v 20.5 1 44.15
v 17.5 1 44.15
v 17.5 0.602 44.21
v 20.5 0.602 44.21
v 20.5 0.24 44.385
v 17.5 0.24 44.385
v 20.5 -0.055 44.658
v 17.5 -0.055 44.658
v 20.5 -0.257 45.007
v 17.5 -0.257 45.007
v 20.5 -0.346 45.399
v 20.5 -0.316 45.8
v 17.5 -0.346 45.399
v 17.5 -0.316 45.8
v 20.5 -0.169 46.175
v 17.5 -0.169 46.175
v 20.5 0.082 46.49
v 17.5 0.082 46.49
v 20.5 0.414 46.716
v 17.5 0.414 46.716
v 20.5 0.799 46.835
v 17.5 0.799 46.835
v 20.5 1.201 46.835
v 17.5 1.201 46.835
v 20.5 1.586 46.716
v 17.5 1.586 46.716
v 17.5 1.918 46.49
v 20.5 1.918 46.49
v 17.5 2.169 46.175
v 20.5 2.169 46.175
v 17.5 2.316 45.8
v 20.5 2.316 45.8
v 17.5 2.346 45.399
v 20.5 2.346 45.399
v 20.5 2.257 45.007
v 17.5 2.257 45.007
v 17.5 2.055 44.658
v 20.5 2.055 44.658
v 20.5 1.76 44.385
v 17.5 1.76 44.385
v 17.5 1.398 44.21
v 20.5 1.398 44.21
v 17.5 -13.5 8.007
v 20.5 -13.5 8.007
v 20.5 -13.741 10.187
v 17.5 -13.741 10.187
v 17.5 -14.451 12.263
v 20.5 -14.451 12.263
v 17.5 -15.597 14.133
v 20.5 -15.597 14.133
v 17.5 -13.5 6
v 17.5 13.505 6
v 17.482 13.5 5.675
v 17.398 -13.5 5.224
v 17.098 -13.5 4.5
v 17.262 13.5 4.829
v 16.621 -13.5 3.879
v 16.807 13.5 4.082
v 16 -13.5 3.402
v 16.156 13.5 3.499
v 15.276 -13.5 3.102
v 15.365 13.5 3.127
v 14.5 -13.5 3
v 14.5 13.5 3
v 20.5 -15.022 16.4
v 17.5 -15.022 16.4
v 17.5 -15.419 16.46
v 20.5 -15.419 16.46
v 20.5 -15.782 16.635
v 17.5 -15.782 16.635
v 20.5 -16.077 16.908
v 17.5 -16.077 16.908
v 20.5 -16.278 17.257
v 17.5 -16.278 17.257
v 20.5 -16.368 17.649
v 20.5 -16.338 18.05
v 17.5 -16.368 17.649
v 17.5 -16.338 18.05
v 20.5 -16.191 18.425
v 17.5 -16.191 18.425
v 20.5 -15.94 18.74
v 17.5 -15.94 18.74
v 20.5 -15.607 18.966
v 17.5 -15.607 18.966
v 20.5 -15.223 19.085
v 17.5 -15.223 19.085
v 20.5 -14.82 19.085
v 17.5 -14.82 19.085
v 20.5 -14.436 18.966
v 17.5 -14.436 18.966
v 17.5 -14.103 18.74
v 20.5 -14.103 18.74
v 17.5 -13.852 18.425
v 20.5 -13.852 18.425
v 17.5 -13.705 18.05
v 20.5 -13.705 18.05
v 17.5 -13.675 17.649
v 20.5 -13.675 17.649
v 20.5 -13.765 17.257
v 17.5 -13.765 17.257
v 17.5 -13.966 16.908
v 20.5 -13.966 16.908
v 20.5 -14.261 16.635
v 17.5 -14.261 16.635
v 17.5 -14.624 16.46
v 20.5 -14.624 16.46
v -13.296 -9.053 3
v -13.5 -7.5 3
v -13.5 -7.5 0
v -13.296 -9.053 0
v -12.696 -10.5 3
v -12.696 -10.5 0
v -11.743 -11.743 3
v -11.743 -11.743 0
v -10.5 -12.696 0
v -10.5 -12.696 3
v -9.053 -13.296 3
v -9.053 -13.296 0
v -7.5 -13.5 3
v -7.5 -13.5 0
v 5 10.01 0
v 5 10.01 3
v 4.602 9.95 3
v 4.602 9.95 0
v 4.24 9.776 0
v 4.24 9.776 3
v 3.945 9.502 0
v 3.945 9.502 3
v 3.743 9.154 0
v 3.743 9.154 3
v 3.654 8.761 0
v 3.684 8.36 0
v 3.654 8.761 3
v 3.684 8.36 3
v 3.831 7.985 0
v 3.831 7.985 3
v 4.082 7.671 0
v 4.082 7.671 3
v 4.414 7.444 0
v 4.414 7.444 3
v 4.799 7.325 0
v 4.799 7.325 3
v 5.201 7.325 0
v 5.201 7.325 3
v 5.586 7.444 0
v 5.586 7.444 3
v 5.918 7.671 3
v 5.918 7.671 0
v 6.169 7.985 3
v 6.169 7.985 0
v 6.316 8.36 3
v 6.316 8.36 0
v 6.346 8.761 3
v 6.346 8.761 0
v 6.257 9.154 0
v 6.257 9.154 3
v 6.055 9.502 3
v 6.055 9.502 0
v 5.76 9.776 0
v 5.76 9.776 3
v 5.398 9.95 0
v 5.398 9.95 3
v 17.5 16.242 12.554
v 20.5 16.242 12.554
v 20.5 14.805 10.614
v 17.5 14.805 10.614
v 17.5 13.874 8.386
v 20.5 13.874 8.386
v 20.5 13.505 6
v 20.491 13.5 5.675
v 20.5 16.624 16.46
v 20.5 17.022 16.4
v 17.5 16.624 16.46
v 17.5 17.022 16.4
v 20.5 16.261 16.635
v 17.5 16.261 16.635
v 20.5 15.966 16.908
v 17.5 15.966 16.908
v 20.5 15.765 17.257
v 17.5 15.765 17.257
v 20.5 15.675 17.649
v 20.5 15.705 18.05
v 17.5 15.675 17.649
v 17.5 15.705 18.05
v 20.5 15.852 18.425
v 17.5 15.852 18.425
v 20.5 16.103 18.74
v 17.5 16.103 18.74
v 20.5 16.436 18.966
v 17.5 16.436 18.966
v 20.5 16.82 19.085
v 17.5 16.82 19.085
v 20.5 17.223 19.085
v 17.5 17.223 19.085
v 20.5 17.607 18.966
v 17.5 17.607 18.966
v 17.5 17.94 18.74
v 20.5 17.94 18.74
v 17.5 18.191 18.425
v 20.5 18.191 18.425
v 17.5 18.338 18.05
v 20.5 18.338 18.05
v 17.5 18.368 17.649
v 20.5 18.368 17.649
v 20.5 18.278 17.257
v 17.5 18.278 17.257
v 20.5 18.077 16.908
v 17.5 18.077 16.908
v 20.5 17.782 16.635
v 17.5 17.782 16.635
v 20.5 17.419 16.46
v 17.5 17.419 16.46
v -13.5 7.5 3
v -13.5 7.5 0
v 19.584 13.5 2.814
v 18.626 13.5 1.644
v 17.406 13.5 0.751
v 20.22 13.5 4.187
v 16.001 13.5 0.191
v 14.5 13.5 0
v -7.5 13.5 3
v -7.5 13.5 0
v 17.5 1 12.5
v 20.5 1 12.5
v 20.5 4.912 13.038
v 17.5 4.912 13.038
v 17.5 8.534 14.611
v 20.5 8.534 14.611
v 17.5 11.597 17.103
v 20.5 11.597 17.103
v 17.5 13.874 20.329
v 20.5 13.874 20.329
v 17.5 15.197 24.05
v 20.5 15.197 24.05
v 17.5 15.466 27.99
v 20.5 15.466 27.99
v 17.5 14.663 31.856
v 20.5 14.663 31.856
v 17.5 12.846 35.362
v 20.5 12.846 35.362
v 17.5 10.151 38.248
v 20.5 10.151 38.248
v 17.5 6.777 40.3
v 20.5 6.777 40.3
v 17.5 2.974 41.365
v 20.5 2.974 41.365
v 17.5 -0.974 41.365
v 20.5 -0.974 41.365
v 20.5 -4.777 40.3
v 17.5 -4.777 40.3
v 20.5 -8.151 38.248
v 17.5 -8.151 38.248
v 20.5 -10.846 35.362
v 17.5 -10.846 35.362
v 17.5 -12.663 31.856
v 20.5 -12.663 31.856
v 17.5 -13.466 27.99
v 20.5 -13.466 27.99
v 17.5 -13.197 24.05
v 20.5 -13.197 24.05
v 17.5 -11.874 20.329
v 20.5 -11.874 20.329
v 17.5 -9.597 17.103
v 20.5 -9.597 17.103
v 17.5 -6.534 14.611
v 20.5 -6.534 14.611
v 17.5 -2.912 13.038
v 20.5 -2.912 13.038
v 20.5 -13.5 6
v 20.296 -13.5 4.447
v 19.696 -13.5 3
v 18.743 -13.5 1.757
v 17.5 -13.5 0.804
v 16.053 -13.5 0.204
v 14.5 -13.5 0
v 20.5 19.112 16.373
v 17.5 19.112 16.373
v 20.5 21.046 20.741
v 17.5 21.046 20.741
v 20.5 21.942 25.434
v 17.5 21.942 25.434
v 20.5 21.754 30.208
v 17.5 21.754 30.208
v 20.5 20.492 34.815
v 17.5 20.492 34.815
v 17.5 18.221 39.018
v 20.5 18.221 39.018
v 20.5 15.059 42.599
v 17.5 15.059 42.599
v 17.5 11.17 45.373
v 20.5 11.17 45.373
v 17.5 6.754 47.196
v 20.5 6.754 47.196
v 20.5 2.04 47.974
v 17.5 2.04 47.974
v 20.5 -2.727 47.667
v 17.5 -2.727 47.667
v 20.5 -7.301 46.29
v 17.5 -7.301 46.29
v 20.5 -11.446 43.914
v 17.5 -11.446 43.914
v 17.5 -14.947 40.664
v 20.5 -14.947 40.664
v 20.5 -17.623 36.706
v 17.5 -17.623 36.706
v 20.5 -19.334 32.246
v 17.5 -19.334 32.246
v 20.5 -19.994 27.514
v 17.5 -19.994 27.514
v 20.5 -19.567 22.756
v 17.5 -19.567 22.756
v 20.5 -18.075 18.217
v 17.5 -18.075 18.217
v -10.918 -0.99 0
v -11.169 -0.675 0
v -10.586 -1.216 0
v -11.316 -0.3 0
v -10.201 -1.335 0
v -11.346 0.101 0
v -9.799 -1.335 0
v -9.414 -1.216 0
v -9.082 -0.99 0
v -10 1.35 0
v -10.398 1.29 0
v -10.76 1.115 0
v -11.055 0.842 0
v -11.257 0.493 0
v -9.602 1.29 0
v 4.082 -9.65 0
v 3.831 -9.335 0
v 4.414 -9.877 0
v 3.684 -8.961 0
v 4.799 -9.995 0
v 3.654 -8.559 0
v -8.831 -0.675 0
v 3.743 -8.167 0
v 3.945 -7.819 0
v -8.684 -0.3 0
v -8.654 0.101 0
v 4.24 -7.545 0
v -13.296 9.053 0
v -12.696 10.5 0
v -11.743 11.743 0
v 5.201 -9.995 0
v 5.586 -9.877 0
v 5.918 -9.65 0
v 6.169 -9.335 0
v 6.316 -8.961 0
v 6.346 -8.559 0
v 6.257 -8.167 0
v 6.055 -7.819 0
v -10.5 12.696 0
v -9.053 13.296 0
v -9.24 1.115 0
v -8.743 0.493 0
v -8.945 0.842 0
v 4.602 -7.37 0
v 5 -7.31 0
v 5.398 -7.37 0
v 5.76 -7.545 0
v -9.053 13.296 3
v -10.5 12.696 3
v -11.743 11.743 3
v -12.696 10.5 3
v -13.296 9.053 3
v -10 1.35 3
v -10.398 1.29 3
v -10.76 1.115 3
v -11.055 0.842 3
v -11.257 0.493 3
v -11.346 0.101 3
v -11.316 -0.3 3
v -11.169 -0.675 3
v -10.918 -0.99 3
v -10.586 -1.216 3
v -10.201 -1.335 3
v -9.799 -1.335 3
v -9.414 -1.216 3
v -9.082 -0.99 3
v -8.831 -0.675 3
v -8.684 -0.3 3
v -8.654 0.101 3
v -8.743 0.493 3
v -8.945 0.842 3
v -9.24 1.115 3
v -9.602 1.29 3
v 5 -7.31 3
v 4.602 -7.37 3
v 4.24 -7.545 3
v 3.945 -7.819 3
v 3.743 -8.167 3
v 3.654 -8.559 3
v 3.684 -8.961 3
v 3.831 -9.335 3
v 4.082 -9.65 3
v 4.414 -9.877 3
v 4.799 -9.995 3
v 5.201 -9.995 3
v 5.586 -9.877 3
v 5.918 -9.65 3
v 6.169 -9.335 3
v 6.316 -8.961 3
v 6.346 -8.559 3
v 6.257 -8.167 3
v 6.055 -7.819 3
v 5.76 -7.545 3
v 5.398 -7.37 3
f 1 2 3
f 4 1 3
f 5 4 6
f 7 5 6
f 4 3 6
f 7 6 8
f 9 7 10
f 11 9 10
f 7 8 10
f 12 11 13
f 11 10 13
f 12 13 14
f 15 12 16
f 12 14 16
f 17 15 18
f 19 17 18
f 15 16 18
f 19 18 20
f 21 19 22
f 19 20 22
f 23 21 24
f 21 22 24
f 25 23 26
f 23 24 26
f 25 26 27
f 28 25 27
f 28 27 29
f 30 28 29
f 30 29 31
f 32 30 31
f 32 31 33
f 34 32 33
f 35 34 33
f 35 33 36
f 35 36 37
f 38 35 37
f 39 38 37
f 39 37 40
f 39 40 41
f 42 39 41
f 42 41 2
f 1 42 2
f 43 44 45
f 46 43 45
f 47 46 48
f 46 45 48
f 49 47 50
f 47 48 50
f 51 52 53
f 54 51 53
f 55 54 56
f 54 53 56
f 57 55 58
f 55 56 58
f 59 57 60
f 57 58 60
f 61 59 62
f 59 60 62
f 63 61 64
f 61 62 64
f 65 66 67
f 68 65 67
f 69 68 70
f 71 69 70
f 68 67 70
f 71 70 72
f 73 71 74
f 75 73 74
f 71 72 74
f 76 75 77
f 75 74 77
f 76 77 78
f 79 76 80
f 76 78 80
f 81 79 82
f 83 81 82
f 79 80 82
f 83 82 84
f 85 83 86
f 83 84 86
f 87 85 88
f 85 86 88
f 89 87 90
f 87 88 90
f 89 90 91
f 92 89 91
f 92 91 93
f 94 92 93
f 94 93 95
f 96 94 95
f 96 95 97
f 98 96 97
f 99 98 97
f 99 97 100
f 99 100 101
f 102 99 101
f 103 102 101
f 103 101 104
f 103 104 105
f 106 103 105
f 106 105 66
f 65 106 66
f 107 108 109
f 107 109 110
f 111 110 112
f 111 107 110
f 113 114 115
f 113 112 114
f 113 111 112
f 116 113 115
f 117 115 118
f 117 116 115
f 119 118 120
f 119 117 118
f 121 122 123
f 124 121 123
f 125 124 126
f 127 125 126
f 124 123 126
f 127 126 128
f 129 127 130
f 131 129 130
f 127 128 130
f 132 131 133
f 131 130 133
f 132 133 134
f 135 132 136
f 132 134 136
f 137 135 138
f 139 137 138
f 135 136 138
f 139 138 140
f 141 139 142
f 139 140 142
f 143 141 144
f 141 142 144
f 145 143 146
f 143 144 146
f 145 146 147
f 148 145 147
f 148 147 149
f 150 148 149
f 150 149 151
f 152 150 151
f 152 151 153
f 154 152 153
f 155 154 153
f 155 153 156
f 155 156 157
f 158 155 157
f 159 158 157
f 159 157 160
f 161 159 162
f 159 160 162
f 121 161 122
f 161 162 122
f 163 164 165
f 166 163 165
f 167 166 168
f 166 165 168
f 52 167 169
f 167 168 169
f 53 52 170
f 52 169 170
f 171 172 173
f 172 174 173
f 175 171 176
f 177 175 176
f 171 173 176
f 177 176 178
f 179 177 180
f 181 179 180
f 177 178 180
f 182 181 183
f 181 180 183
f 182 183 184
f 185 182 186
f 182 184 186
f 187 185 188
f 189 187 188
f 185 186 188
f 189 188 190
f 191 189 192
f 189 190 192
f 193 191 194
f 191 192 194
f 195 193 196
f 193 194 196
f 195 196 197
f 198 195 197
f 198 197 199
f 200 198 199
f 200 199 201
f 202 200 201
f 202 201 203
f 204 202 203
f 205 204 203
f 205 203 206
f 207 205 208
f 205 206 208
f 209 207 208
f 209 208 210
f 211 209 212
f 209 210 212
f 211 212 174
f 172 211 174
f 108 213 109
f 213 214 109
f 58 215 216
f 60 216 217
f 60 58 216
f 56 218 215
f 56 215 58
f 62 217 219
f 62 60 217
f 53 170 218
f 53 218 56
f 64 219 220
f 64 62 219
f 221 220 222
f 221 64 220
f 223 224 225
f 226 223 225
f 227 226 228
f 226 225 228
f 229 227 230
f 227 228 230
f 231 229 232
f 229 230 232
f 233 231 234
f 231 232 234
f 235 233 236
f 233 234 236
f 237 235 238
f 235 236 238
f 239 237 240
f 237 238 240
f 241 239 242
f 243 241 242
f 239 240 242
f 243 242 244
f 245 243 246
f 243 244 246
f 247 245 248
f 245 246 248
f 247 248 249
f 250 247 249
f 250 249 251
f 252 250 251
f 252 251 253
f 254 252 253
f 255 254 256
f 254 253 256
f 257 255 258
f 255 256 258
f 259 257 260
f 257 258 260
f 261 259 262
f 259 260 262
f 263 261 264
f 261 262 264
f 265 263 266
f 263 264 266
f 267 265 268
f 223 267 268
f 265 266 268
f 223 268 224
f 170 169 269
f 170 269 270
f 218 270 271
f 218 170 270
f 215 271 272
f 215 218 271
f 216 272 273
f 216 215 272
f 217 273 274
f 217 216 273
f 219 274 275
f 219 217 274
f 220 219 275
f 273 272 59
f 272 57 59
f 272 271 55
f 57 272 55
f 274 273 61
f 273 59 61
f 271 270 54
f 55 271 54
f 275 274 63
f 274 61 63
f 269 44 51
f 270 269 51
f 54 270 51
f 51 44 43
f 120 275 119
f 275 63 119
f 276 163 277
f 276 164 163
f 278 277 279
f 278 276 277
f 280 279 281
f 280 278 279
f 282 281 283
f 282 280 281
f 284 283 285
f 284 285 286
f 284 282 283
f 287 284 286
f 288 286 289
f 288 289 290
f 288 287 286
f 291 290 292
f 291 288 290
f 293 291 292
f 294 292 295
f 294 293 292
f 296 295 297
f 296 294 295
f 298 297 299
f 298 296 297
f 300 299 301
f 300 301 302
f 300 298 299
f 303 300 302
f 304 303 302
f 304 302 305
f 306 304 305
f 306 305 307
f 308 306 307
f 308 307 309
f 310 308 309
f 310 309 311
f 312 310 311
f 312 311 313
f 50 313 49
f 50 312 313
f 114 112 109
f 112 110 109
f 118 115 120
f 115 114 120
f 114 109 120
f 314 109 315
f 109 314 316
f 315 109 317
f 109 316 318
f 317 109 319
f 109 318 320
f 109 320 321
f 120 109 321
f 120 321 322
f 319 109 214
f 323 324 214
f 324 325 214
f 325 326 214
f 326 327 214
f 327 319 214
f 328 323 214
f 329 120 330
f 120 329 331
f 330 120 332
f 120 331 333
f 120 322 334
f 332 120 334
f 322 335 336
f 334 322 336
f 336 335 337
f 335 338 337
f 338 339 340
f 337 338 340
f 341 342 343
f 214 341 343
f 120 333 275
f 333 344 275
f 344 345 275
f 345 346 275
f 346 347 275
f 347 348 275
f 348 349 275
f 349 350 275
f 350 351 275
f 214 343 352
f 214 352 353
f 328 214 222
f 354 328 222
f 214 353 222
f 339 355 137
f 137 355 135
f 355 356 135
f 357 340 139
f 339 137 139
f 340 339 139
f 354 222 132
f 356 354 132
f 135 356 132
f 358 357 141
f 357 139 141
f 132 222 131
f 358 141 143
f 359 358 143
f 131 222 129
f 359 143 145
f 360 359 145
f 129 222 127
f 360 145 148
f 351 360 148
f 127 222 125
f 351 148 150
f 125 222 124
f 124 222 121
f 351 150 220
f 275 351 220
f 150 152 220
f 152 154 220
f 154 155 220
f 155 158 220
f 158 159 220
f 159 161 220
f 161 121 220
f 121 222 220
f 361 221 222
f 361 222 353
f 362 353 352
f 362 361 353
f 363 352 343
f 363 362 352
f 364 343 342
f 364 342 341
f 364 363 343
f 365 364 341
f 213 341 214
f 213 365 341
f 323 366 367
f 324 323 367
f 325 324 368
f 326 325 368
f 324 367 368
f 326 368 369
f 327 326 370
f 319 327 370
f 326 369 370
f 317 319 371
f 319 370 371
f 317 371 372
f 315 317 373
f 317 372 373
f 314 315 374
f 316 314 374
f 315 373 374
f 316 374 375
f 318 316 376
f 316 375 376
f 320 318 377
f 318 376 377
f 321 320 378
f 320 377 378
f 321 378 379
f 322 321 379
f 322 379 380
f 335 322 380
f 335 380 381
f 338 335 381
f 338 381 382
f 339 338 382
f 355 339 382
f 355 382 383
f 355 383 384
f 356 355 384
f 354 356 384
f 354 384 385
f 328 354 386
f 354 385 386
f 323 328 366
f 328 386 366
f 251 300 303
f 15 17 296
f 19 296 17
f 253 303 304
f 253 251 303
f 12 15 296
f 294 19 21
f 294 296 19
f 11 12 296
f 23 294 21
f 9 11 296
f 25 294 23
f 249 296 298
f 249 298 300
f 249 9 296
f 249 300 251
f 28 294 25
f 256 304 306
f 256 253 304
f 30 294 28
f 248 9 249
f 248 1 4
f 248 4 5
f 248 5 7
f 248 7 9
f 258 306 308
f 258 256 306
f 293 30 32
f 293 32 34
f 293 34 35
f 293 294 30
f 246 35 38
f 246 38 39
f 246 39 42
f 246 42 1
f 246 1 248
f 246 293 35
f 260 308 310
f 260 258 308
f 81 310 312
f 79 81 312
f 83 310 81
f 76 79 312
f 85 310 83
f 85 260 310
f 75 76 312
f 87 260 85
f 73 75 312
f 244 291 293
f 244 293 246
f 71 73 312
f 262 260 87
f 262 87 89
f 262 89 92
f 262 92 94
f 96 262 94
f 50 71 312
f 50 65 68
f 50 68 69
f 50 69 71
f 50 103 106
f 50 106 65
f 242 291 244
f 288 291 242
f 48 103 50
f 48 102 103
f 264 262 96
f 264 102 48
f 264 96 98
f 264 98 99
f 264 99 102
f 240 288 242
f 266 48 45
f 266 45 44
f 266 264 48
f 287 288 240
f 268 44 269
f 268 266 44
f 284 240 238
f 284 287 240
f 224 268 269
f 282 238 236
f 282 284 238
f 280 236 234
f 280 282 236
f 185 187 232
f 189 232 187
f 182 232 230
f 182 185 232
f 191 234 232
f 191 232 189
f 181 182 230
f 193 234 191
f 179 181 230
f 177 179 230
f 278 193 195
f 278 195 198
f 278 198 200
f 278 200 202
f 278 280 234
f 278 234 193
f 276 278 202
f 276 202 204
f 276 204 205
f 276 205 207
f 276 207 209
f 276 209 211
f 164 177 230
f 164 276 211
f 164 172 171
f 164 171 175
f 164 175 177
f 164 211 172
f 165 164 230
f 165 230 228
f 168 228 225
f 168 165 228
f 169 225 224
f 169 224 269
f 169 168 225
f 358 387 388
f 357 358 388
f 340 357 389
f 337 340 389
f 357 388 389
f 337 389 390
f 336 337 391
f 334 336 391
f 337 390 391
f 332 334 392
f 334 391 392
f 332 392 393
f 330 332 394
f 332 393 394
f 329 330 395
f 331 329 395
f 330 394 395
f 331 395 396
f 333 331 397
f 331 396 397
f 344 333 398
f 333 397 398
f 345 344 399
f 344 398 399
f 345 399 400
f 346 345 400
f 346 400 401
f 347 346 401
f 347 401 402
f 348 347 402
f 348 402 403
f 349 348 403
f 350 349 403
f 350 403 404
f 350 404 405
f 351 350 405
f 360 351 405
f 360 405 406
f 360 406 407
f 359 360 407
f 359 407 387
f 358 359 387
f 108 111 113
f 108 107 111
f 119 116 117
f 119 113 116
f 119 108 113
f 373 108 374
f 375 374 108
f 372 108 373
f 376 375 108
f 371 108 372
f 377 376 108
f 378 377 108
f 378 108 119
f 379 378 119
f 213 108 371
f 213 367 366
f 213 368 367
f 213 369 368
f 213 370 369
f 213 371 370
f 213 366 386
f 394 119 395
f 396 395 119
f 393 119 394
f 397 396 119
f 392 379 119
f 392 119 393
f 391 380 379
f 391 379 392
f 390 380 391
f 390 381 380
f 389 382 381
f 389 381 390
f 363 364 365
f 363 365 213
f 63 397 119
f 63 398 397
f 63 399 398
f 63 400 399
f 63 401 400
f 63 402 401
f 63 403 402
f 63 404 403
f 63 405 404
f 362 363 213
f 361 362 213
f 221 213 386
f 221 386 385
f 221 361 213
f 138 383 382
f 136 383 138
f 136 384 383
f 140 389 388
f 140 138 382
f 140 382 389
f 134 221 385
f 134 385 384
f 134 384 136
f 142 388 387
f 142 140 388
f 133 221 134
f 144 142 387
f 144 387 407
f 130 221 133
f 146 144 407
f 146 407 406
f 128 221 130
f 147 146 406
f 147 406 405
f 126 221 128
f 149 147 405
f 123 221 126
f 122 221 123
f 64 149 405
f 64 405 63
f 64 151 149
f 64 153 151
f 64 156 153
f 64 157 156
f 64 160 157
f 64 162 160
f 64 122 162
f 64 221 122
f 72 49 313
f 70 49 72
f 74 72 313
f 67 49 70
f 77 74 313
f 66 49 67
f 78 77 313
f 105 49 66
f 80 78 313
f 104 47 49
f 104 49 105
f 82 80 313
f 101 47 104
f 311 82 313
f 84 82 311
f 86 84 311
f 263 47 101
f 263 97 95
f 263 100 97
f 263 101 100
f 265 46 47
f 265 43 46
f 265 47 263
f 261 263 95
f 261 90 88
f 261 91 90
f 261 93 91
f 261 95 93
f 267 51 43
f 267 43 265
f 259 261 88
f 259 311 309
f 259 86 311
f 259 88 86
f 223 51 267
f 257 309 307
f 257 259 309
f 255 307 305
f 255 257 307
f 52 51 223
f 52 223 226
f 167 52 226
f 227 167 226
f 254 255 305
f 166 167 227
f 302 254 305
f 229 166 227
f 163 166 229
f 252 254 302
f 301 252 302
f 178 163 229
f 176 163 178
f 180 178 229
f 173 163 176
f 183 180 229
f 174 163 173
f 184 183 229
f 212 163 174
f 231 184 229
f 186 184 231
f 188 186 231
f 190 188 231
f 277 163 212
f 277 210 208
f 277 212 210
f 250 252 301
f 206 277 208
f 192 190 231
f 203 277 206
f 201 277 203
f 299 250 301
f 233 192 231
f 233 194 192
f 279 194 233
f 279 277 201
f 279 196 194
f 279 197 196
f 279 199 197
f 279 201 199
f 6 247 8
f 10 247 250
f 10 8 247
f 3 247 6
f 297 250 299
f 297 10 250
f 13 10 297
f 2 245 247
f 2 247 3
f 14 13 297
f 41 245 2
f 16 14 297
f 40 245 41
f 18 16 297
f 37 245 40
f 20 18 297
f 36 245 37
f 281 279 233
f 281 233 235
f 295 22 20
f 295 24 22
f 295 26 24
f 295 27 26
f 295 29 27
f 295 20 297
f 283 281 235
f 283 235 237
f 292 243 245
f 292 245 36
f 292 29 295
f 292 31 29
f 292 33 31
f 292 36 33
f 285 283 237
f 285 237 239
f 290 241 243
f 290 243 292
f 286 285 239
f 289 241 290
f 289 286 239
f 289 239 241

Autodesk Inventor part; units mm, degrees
ref_plane "YZ Plane" through (0, 0, 0) normal (1, 0, 0) x (0, 1, 0)
ref_plane "XZ Plane" through (0, 0, 0) normal (0, 1, 0) x (-1, 0, 0)
ref_plane "XY Plane" through (0, 0, 0) normal (0, 0, 1) x (1, 0, 0)
sketch "スケッチ1" plane through (0, 0, 0) normal (0, 0, 1) x (1, 0, 0)
  circle A0 centre (0, 0) radius 13.5
  line L0 (0, 13.5) -> (14.5, 13.5)
  line L1 (14.5, 13.5) -> (14.5, -13.5)
  line L2 (14.5, -13.5) -> (0, -13.5)
  line L3 (0, -13.5) -> (0, 13.5)
  line L4 (0, 0) -> (14.5, 0) construction
  point P0 (0, 13.5)
  point P1 (0, -13.5)
  point P2 (0, -13.5)
  dimension "d0" = 27
  dimension "d1" = 27
  dimension "d2" = 14.5
extrude "プレート1" add sketch "スケッチ1" along normal blind 3
sketch "スケッチ2" plane through (17.5, 13.5, 6) normal (1, 0, 0) x (0, 1, 0)
  line L0 (-27, 0) -> (0, 0)
  line L1 (0, 0) -> (0, 19)
  line L2 (0, 19) -> (-27, 19)
  line L3 (-27, 19) -> (-27, 0)
edge flange "フランジ1" height 25 angle 90 thickness 3 bend radius 3 thickness toward (1, 0, 0) relief tear relief width 3 relief depth 1.5 edges at (14.5, 0, 3) wall of the first edge with corners at (17.5, -13.5, 6) (17.5, 13.5, 6) (17.5, 13.5, 25) (17.5, -13.5, 25)
bend "曲げ1"
corner "コーナー1"
sketch "スケッチ3" plane through (0, 0, 0) normal (0, 0, -1) x (-1, 0, 0)
  point P0 (0, 0)
  point P1 (10, 0)
  point P2 (-5, 8.6603)
  point P3 (-5, -8.6603)
  dimension "d14" = 10
  dimension "d17" = 360
hole "穴1" at (-10, 0, 0) at (5, 8.6603, 0) at (5, -8.6603, 0) direction (0, 0, 1) diameter 2.7 depth 3
sketch "スケッチ4" plane through (20.5, -13.5, 25) normal (1, 0, 0) x (0, 0, -1)
  circle A0 centre (-2, 14.5) radius 21
  line L0 (25, 27) -> (25, 0) projected
  point P0 (25, 13.5)
  dimension "d26" = 42
  dimension "d29" = 27
extrude "押し出し1" add sketch "スケッチ4" against normal up to surface (3 mm away)
sketch "スケッチ5" plane through (20.5, -13.5, 6) normal (1, 0, 0) x (0, 0, -1)
  arc A0 (-4.1255, 27) -> (-5.8095, 0) centre (-21, 14.5) ccw projected
  circle A1 centre (-21, 14.5) radius 14.5
  point P0 (6, 13.5)
  dimension "d30" = 29
extrude "押し出し2" cut sketch "スケッチ5" against normal up to surface (3 mm away)
sketch "スケッチ7" plane through (20.5, -13.5, 6) normal (1, 0, 0) x (0, 0, -1)
  circle A0 centre (-21, 14.5) radius 14.5 projected
  point P0 (6, 13.5)
  point P1 (-39.5, 14.5)
  point P2 (-11.75, -1.5215)
  point P3 (-11.75, 30.5215)
  dimension "d33" = 18.5
  dimension "d36" = 360
hole "穴2" at (20.5, 1, 45.5) at (20.5, -15.0215, 17.75) at (20.5, 17.0215, 17.75) direction (-1, 0, 0) diameter 2.7 depth 3
fillet "フィレット1" radius 10 2 edges at (19, -13.5, 11.8095) (19, 13.5, 10.1255)
sketch "スケッチ9" plane through (0, 0, 0) normal (0, 0, -1) x (-1, 0, 0)
  arc A0 (0, -13.5) -> (0, 13.5) centre (0, 0) ccw projected
  line L0 (0, 13.5) -> (13.5, 13.5)
  line L1 (13.5, 13.5) -> (13.5, -13.5)
  line L2 (13.5, -13.5) -> (0, -13.5)
  line L3 (0, -13.5) -> (0, 13.5)
  circle A1 centre (-5, -8.6603) radius 1.35 projected
  circle A2 centre (-5, 8.6603) radius 1.35 projected
  circle A3 centre (10, 0) radius 1.35 projected
  line L4 (0, 13.5) -> (-14.5, 13.5) projected
  line L5 (-14.5, 13.5) -> (-14.5, -13.5) projected
  line L6 (-14.5, -13.5) -> (0, -13.5) projected
  arc A4 (0, -13.5) -> (0, 13.5) centre (0, 0) ccw projected
  point P0 (13.5, 0)
  dimension "d48" = 13.5
  dimension "d49" = 27
extrude "押し出し3" add sketch "スケッチ9" against normal up to surface (3 mm away) contours A0 L1 L2 | A0 L0 L1
fillet "フィレット2" radius 6 2 edges at (-13.5, 13.5, 1.5) (-13.5, -13.5, 1.5)
equation "\"d24\" = Thickness"
equation "\"d3\" = Thickness"
equation "\"d4\" = BendReliefWidth"
equation "\"d5\" = BendReliefDepth"
equation "\"d6\" = MinimumRemnant"
equation "\"d7\" = TransitionRadius"
equation "\"d10\" = BendRadius"
equation "\"d11\" = CornerReliefSize"
equation "\"d12\" = GapSize"
equation "\"d13\" = JacobiRadiusSize"
equation "\"BendRadius\" = Thickness"
equation "\"BendReliefWidth\" = Thickness"
equation "\"BendReliefDepth\" = 0.5 * Thickness"
equation "\"CornerReliefSize\" = 4 * Thickness"
equation "\"MinimumRemnant\" = 2 * Thickness"
equation "\"TransitionRadius\" = BendRadius"
equation "\"JacobiRadiusSize\" = BendRadius"
equation "\"GapSize\" = Thickness"
equation "\"Thickness\" = 3"
properties part number "wrist_roll_plate" material "アルミニウム 6061"
